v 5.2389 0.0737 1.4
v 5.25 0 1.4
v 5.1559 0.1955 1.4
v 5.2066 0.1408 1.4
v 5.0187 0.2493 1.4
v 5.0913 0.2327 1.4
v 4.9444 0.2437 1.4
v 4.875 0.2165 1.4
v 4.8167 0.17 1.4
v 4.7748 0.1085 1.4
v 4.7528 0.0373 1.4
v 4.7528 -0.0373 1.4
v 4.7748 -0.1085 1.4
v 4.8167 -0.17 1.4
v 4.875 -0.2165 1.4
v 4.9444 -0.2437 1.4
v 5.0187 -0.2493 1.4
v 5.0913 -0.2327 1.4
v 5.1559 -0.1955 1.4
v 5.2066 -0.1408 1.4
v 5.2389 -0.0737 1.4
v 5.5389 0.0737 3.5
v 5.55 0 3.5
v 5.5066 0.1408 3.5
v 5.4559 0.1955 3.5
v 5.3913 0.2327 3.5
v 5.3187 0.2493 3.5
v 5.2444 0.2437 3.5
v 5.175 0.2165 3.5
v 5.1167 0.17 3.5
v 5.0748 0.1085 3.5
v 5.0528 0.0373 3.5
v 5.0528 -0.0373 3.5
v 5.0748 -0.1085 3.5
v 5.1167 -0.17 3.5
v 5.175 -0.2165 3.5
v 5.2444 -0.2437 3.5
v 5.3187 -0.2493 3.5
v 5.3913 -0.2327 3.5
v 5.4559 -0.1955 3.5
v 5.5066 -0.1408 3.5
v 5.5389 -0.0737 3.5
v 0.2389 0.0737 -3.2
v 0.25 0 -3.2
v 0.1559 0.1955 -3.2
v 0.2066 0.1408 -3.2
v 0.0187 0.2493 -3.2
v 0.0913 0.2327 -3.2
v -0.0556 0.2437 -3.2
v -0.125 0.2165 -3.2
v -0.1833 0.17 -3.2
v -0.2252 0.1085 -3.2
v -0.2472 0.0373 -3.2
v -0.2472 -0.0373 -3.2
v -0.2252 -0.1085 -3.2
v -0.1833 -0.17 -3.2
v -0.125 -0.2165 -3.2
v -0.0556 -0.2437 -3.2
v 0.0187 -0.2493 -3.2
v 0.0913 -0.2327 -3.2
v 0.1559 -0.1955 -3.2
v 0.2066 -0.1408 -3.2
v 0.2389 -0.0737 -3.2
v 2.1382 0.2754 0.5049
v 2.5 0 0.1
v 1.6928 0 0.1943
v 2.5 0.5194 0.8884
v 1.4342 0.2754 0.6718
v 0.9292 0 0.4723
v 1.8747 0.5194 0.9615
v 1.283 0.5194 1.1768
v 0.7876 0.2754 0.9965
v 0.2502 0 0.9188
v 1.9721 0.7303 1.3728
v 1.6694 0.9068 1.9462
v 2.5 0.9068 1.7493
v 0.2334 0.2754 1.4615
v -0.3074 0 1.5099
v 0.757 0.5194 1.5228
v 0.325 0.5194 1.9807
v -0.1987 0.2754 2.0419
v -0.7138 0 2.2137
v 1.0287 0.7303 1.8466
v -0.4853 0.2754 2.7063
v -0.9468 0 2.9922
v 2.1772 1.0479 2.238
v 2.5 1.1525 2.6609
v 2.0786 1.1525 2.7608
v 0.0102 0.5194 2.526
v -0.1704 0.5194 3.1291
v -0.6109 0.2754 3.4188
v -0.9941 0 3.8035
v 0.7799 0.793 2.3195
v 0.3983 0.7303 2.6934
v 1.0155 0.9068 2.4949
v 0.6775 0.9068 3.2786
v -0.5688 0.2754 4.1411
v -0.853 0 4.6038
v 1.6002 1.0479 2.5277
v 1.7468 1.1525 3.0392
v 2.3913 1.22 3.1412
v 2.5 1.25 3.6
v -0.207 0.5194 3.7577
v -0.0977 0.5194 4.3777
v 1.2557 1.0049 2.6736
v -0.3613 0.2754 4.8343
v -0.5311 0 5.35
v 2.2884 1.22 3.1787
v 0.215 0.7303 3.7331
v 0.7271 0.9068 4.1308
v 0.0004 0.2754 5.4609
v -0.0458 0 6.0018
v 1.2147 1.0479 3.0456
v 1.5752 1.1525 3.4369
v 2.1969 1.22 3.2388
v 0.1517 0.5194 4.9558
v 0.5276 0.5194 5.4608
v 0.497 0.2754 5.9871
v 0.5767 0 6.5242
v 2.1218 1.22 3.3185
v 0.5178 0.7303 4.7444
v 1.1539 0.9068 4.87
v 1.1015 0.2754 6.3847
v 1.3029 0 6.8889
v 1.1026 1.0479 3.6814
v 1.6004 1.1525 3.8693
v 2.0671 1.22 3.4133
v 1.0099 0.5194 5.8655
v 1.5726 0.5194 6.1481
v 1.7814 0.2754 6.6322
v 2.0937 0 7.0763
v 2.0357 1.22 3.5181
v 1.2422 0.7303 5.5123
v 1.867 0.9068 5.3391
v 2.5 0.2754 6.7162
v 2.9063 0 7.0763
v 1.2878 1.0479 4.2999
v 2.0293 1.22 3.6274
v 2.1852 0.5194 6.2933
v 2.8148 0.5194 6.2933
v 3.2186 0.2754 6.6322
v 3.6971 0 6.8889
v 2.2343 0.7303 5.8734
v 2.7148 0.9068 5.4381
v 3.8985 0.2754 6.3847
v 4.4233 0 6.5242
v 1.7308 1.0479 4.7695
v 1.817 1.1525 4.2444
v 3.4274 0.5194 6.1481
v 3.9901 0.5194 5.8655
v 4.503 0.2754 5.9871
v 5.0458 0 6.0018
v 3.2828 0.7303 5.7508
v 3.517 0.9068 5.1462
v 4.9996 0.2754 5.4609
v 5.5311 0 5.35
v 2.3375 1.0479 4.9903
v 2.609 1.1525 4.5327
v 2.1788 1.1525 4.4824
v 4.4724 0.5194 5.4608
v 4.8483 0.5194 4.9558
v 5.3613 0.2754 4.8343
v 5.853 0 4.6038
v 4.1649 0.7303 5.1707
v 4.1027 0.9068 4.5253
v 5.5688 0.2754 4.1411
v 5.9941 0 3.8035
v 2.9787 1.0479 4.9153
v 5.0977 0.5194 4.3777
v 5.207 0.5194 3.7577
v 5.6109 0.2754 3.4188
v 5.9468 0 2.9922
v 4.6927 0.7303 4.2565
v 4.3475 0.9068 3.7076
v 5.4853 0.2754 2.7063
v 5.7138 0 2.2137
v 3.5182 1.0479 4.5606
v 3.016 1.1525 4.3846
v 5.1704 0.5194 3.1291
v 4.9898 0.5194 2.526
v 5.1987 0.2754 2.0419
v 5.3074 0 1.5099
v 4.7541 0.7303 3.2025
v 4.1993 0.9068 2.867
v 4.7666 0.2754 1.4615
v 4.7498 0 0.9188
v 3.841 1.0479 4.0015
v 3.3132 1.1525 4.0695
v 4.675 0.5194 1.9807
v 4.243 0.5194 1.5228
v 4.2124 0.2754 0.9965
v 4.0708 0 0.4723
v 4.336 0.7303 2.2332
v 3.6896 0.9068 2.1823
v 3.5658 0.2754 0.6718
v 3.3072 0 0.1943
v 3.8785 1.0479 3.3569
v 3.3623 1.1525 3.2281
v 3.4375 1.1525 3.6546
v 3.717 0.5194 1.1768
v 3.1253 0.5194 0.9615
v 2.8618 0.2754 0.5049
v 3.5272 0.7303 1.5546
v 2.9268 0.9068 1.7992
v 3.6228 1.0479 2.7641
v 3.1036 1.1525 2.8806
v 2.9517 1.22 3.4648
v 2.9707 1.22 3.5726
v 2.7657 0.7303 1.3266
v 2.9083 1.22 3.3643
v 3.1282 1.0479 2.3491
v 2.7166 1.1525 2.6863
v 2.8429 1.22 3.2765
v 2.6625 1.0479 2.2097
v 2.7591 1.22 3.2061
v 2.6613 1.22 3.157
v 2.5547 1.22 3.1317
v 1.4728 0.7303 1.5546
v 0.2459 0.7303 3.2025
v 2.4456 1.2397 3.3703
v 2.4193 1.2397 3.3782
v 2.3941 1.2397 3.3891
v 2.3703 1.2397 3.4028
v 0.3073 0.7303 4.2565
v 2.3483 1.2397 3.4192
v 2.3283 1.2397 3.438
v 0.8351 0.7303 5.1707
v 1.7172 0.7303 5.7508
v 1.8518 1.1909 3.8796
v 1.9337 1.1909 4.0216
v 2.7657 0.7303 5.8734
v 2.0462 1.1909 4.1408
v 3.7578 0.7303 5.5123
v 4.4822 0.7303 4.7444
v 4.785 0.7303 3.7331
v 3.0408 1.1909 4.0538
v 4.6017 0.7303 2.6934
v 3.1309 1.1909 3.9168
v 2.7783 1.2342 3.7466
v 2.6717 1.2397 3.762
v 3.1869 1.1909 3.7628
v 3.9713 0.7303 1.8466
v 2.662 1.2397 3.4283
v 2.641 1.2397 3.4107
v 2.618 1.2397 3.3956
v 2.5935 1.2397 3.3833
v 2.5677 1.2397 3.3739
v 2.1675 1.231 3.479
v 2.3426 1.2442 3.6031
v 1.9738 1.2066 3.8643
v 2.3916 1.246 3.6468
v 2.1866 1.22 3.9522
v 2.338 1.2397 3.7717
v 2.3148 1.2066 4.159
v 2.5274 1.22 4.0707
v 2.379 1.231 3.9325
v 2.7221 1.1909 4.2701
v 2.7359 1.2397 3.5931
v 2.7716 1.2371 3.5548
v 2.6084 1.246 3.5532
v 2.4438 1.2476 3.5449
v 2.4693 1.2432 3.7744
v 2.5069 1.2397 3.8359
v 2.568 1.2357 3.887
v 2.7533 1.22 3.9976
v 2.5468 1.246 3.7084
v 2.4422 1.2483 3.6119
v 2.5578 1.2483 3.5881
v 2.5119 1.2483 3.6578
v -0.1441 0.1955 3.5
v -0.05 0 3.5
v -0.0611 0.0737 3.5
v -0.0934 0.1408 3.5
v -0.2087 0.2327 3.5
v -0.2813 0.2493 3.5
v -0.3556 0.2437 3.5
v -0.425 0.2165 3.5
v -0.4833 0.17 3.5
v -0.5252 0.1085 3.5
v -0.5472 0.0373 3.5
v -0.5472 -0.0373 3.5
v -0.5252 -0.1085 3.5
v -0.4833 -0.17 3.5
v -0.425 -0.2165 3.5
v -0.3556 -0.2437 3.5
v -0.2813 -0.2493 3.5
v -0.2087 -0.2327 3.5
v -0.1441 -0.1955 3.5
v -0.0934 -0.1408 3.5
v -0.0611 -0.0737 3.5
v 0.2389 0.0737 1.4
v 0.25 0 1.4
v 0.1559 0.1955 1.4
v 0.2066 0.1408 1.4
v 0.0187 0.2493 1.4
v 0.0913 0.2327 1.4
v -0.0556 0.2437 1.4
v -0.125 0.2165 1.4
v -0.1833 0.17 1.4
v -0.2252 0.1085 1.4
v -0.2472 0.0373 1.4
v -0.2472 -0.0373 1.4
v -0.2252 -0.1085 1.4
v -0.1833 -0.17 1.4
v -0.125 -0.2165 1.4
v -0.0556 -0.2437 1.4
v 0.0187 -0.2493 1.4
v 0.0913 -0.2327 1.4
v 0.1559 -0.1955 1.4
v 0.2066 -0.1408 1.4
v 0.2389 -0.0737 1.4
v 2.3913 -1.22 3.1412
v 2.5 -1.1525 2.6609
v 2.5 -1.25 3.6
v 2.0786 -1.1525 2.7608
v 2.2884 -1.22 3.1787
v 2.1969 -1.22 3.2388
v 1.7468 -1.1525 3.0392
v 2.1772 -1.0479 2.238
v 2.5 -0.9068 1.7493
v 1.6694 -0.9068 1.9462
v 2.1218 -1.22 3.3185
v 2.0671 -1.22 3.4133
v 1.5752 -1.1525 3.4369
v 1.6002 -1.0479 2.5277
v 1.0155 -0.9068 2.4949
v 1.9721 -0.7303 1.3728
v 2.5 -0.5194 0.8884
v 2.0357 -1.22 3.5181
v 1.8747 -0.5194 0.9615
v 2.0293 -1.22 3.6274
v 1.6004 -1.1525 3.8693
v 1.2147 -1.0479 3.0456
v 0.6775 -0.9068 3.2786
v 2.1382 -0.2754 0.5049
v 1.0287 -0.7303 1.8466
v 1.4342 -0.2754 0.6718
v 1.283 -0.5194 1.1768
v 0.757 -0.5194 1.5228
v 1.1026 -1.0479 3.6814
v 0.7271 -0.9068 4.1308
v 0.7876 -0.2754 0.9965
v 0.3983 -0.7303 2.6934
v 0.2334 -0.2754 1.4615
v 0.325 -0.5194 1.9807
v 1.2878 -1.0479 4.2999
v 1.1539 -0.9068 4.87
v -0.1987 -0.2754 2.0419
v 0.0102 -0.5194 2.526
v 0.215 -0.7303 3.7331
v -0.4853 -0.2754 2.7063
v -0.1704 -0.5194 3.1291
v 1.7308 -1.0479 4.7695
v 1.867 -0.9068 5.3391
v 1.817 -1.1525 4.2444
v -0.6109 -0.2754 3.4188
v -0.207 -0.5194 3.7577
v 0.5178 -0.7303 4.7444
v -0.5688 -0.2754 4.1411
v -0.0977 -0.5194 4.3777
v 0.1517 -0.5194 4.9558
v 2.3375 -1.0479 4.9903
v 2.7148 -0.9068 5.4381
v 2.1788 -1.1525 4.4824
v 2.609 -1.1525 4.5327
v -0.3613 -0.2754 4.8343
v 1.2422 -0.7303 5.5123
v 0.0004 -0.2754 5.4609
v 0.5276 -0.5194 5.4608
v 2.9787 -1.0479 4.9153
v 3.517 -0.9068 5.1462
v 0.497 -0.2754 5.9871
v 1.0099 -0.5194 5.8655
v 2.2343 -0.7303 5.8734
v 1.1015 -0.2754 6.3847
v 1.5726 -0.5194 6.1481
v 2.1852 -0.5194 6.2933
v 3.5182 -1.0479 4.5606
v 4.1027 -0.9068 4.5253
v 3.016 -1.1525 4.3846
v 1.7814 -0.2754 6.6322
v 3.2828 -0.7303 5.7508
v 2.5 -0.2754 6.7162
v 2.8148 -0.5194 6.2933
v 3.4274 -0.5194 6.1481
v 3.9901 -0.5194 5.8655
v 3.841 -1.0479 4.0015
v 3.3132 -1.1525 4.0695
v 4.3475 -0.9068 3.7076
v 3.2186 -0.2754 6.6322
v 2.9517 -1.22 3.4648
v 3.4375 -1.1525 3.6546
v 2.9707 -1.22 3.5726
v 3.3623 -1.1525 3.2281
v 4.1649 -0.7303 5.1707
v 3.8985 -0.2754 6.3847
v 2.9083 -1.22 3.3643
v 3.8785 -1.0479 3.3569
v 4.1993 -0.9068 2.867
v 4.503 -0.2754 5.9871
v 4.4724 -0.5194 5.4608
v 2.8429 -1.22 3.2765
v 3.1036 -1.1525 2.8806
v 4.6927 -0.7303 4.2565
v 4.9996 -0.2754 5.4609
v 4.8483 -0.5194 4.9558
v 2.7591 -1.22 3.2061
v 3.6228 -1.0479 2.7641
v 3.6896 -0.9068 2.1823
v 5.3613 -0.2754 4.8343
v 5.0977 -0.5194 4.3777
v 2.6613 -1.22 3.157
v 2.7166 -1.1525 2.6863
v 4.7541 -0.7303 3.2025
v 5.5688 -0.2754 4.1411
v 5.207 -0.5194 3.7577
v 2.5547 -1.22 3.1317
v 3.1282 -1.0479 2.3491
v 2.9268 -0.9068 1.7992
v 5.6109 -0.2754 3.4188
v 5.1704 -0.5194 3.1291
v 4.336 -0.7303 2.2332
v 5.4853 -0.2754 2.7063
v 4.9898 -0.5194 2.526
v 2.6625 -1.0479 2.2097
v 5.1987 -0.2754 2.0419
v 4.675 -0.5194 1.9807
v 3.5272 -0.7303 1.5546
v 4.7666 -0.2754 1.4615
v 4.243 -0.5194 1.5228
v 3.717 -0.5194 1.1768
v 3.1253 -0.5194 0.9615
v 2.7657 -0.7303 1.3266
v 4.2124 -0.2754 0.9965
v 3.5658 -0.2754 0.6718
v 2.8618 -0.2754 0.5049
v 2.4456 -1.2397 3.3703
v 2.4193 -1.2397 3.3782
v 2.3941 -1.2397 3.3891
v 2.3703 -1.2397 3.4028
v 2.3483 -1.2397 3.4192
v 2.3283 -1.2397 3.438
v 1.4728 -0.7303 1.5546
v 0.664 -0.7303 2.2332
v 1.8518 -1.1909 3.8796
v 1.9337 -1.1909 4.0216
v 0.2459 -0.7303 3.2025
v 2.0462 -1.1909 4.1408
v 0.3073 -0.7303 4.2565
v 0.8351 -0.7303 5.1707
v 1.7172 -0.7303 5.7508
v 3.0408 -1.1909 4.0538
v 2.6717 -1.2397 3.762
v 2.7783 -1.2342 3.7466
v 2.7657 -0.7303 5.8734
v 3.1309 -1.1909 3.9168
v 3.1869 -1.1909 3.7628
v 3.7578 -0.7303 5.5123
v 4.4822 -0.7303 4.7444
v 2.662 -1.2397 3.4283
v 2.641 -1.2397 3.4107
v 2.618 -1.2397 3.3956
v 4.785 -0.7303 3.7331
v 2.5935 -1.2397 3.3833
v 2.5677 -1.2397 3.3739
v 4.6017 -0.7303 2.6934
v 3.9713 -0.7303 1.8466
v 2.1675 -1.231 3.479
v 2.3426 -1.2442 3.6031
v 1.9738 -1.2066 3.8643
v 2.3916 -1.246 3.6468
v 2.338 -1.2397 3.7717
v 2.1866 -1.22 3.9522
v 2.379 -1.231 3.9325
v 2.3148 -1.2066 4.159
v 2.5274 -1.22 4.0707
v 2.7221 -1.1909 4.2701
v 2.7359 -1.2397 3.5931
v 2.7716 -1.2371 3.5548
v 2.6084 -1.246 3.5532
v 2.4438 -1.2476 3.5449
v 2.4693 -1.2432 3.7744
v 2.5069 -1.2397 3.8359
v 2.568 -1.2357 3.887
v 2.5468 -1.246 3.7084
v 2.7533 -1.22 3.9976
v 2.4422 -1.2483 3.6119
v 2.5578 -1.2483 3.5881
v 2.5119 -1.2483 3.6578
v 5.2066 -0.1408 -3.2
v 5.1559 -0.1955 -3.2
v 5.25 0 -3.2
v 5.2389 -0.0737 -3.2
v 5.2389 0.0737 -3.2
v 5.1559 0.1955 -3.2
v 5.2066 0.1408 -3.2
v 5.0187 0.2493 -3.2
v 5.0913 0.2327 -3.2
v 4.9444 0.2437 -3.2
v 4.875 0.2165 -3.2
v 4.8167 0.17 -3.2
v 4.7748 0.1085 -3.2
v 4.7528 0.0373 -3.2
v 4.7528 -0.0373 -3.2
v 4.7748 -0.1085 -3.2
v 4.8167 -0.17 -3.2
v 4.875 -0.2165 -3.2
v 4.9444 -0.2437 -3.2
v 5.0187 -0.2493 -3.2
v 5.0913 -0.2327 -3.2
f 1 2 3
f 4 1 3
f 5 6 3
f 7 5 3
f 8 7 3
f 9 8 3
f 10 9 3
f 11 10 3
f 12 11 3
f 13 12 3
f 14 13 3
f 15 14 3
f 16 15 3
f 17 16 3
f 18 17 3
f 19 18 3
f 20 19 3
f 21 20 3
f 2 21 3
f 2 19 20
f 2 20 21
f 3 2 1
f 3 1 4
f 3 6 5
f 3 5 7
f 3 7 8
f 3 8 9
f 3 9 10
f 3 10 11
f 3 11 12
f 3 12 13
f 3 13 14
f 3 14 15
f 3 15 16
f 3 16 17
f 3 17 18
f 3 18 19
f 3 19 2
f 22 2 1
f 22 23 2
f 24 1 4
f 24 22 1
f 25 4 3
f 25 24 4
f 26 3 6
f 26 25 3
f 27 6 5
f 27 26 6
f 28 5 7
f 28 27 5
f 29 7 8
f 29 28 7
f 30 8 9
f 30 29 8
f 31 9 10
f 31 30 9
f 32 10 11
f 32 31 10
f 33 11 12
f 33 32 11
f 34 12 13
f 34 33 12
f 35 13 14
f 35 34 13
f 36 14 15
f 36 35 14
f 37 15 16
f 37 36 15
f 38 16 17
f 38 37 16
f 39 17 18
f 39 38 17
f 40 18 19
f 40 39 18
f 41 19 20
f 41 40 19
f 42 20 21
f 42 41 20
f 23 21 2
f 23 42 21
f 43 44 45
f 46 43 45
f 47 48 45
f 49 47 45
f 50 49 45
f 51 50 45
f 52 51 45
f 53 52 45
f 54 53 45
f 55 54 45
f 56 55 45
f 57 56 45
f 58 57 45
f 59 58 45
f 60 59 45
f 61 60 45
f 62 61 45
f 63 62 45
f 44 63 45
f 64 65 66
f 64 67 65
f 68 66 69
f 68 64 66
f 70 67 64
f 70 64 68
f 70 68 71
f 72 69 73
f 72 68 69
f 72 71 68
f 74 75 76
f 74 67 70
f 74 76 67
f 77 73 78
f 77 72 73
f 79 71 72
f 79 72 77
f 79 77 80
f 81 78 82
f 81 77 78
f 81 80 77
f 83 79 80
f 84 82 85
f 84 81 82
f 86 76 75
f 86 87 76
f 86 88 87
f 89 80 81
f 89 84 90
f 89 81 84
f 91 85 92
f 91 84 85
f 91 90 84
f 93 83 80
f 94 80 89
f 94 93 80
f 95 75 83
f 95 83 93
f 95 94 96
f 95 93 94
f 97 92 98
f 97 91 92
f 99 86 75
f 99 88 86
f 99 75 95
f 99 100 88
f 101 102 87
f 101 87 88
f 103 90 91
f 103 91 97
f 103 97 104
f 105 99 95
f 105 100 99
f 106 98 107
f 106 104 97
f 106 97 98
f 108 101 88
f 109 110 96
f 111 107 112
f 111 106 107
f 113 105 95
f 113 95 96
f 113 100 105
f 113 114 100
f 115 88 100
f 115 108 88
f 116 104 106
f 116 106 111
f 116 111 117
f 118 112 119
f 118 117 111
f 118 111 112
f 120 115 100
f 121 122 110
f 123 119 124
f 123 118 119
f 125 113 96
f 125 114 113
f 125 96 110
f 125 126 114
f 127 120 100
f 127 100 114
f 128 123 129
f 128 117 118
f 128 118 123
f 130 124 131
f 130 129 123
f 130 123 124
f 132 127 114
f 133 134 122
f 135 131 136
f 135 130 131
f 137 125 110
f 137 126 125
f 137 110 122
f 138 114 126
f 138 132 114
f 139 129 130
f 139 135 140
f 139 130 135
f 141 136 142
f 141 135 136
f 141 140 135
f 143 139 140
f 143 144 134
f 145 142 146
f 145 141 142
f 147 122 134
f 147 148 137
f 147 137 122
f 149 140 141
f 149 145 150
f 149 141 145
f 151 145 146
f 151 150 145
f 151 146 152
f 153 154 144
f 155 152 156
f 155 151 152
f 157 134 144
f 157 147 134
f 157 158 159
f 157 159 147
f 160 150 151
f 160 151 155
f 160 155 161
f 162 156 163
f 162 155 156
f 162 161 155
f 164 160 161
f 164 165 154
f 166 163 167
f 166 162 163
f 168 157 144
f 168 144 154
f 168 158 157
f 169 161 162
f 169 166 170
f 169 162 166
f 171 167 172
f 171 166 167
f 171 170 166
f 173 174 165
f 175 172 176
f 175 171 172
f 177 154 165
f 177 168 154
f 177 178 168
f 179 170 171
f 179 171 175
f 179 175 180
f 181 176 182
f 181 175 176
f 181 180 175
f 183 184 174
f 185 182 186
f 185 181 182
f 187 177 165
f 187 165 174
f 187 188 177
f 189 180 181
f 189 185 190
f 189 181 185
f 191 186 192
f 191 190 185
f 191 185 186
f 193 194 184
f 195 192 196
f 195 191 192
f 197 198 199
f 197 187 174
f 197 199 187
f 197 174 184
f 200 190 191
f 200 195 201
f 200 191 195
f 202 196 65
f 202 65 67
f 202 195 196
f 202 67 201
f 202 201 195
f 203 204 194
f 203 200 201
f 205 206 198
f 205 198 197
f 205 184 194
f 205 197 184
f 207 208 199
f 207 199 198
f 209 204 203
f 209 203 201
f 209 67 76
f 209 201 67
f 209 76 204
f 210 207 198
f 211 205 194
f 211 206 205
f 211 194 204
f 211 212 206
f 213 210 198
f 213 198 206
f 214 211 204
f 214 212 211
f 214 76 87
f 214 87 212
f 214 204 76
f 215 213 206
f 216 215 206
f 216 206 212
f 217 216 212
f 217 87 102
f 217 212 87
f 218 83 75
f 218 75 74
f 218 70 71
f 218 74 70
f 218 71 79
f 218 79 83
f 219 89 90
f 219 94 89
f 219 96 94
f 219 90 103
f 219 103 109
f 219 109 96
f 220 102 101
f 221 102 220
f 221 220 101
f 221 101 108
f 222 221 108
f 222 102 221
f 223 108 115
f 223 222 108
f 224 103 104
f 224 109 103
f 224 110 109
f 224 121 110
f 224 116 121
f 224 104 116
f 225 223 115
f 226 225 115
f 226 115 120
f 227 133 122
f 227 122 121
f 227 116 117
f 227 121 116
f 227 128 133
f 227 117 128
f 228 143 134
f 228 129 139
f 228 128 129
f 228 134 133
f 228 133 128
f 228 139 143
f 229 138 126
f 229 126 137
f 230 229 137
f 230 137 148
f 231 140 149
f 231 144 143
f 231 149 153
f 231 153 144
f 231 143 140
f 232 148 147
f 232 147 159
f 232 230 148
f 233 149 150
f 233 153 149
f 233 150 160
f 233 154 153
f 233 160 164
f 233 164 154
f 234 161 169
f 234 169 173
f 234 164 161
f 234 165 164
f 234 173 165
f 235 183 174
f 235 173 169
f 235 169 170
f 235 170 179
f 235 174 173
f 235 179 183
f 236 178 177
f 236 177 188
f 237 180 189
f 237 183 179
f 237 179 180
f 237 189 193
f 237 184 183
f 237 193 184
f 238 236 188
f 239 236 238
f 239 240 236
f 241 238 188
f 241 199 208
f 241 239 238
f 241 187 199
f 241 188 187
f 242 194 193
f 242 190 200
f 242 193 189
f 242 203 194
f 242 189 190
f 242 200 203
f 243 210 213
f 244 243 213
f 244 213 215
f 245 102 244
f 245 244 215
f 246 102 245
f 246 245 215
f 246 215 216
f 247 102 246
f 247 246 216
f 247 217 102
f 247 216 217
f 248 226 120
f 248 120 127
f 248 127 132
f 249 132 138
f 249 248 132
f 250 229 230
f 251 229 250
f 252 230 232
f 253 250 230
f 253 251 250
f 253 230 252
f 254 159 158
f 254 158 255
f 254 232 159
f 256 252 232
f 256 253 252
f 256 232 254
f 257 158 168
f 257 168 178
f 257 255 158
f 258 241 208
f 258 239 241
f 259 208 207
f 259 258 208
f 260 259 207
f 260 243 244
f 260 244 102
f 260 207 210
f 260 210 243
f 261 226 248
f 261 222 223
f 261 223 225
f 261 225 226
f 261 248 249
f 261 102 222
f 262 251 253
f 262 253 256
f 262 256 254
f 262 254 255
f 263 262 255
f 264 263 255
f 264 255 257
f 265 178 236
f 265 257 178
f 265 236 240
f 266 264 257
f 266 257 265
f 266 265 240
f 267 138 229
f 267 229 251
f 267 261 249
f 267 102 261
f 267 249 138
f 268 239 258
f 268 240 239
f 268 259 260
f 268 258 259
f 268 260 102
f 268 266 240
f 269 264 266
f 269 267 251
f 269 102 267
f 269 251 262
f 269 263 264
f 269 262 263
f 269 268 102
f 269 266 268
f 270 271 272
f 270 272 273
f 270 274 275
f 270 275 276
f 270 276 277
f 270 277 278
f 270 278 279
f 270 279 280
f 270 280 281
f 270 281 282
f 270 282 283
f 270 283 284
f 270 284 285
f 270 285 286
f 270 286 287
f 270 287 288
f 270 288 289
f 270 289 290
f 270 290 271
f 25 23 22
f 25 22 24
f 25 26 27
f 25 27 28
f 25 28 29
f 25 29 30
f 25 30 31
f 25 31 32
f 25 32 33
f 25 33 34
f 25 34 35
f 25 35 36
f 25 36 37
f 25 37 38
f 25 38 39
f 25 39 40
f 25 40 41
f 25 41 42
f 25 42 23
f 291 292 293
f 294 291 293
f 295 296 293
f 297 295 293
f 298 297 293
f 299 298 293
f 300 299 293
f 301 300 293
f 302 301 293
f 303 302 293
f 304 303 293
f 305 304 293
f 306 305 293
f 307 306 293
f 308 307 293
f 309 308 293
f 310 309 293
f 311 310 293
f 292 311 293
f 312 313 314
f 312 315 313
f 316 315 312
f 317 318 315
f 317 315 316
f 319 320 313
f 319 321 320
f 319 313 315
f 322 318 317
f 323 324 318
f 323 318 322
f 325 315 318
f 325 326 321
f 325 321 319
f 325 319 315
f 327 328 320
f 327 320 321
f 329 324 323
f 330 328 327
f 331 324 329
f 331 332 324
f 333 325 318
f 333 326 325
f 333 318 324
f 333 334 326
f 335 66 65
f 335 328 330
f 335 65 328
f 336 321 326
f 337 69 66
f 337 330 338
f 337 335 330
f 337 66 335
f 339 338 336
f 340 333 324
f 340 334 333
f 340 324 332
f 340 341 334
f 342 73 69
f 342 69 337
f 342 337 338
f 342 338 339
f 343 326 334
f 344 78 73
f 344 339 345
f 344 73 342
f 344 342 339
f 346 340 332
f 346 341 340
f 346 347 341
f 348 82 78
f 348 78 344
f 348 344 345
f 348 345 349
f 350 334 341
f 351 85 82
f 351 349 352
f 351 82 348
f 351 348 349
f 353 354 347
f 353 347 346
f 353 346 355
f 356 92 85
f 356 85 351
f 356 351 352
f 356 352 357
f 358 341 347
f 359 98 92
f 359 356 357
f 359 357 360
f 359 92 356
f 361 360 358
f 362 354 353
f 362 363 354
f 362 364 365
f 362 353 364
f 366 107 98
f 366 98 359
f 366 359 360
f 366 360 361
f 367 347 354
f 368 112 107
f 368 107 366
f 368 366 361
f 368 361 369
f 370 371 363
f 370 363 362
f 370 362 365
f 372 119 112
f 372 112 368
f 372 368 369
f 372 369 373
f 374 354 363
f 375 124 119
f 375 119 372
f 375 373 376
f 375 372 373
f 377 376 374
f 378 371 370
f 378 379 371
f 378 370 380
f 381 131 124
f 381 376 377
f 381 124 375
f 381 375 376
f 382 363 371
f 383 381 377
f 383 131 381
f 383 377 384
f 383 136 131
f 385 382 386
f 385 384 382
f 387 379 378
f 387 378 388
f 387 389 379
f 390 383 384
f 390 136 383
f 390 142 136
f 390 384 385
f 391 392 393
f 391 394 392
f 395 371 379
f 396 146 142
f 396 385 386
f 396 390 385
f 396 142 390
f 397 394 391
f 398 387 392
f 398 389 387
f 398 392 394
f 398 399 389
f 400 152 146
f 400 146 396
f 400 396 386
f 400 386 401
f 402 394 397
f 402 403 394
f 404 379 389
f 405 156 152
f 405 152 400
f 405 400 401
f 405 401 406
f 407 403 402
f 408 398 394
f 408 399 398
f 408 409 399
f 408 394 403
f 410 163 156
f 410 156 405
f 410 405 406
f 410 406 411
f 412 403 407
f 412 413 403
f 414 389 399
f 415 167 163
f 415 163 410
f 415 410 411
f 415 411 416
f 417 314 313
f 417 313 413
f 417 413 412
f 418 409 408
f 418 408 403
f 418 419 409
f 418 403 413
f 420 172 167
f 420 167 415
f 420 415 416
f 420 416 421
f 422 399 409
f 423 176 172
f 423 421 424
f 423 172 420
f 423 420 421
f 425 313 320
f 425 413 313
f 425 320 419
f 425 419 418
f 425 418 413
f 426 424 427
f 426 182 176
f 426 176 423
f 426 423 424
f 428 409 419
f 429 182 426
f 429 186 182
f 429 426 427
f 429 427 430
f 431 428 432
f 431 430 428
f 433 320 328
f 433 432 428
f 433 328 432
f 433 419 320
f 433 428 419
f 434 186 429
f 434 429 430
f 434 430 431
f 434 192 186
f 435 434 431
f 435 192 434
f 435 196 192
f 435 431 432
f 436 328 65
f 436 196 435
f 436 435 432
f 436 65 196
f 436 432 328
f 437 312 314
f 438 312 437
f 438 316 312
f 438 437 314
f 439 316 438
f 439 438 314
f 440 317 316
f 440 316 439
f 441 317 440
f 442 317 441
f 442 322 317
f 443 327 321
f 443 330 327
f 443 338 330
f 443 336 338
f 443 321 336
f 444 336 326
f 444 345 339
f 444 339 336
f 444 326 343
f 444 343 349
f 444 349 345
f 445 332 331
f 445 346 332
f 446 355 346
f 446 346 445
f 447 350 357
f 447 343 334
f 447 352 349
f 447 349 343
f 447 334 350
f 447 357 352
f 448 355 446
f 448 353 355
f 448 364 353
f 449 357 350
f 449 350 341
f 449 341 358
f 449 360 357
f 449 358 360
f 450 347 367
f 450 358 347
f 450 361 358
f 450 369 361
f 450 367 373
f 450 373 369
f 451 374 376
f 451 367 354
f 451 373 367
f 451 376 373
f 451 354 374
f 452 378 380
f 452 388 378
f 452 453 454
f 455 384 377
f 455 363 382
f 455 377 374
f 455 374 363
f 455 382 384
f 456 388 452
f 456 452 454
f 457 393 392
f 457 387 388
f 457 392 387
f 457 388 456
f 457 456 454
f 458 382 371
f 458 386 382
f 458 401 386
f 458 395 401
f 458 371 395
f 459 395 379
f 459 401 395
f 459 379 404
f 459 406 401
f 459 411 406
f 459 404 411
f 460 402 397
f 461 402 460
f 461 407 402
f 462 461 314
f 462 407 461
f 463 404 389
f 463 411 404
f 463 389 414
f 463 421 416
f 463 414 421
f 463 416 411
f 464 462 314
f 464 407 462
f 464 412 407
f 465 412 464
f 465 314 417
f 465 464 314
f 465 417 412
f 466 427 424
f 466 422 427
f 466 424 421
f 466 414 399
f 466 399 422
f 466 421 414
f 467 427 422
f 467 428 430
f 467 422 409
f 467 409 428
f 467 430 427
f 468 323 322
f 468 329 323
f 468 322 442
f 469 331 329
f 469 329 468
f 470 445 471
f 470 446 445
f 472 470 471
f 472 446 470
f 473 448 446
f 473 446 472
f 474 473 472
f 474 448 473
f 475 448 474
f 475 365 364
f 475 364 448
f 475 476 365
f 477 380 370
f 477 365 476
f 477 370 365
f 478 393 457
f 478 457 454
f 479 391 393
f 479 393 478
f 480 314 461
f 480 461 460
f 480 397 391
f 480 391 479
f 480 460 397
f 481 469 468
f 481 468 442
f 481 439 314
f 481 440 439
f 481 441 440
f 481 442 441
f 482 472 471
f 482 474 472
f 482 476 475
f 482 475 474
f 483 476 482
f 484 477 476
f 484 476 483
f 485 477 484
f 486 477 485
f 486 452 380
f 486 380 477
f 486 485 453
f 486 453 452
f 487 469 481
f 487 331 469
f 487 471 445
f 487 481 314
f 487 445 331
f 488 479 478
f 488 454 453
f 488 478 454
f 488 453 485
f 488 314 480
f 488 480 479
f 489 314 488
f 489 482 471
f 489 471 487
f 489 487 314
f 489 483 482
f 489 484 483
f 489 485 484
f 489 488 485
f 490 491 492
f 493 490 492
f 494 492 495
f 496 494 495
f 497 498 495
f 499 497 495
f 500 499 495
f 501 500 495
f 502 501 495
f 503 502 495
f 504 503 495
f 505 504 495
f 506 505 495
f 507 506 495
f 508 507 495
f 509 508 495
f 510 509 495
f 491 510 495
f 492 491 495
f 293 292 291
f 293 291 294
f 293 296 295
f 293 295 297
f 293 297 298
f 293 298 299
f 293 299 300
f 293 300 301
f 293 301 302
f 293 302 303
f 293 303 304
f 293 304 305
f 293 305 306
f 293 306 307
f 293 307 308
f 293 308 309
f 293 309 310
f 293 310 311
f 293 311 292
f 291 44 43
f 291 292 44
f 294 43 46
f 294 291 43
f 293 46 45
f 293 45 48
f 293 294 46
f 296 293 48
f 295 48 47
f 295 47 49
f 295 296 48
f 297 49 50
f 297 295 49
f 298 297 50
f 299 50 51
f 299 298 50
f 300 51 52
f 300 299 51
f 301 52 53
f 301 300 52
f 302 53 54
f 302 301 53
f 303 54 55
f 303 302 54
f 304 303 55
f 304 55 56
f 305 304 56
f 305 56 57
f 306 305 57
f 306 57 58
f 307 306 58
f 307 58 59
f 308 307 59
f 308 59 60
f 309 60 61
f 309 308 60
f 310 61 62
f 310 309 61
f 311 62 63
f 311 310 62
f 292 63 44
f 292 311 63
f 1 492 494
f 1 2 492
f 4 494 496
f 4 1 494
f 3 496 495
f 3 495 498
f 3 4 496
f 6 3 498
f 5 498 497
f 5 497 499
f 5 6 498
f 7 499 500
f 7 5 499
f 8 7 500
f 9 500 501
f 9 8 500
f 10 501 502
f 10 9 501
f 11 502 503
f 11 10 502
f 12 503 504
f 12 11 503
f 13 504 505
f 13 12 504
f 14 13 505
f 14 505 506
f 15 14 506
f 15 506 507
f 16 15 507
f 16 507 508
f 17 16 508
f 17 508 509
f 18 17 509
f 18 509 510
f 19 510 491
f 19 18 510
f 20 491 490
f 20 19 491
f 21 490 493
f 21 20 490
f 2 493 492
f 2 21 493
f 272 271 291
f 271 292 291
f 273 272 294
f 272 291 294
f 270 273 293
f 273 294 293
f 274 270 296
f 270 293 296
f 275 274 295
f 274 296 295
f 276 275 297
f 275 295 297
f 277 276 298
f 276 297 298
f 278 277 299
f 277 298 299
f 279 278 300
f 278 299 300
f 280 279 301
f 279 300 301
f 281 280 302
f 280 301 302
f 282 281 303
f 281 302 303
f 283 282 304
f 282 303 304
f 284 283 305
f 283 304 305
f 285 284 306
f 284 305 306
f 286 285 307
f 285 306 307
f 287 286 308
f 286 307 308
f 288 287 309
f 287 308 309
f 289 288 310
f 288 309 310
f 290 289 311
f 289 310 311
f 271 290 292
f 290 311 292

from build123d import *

# Parameters (mm, degrees)
SKETCH001_R       = 0.25
PAD001_DEPTH      = 1.4
PAD001_DEPTH_BACK = 3.2
SKETCH002_R       = 0.25
SKETCH003_R       = 0.25
SKETCH004_R       = 0.25
SKETCH005_R       = 0.25


with BuildPart() as pad001:
    # Sketch001 → Pad001 (new body, two sides)
    with BuildSketch(Plane.XY) as pad001_sk:
        Circle(SKETCH001_R)
        with Locations((5, 0)):
            Circle(SKETCH001_R)
    extrude(amount=PAD001_DEPTH)
    extrude(pad001_sk.sketch, amount=-PAD001_DEPTH_BACK)


with BuildPart() as revolution:
    # Sketch → Revolution (revolve)
    with BuildSketch(Plane.YZ.offset(2.5)):
        with BuildLine():
            Line((-1.25, 3.6), (1.25, 3.6))
            ThreePointArc((0, 0.1), (0.906846, 1.749341), (1.25, 3.6))
            ThreePointArc((-1.25, 3.6), (-0.906846, 1.749341), (0, 0.1))
        make_face()
    revolve(axis=Axis((2.5, -3.32079, 3.6), (0, 1, 0)))


with BuildPart() as loft_body:
    # Sketch002 → Loft section 0
    with BuildSketch(Plane.XY.offset(3.5)):
        with Locations((-0.3, 0)):
            Circle(SKETCH002_R)
    # Sketch003 → Loft section 1
    with BuildSketch(Plane.XY.offset(1.4)):
        Circle(SKETCH003_R)
    loft()


with BuildPart() as loft001:
    # Sketch004 → Loft001 section 0
    with BuildSketch(Plane.XY.offset(1.4)):
        with Locations((5, 0)):
            Circle(SKETCH004_R)
    # Sketch005 → Loft001 section 1
    with BuildSketch(Plane.XY.offset(3.5)):
        with Locations((5.3, 0)):
            Circle(SKETCH005_R)
    loft()


solid = Compound([pad001.part, revolution.part, loft_body.part, loft001.part])
